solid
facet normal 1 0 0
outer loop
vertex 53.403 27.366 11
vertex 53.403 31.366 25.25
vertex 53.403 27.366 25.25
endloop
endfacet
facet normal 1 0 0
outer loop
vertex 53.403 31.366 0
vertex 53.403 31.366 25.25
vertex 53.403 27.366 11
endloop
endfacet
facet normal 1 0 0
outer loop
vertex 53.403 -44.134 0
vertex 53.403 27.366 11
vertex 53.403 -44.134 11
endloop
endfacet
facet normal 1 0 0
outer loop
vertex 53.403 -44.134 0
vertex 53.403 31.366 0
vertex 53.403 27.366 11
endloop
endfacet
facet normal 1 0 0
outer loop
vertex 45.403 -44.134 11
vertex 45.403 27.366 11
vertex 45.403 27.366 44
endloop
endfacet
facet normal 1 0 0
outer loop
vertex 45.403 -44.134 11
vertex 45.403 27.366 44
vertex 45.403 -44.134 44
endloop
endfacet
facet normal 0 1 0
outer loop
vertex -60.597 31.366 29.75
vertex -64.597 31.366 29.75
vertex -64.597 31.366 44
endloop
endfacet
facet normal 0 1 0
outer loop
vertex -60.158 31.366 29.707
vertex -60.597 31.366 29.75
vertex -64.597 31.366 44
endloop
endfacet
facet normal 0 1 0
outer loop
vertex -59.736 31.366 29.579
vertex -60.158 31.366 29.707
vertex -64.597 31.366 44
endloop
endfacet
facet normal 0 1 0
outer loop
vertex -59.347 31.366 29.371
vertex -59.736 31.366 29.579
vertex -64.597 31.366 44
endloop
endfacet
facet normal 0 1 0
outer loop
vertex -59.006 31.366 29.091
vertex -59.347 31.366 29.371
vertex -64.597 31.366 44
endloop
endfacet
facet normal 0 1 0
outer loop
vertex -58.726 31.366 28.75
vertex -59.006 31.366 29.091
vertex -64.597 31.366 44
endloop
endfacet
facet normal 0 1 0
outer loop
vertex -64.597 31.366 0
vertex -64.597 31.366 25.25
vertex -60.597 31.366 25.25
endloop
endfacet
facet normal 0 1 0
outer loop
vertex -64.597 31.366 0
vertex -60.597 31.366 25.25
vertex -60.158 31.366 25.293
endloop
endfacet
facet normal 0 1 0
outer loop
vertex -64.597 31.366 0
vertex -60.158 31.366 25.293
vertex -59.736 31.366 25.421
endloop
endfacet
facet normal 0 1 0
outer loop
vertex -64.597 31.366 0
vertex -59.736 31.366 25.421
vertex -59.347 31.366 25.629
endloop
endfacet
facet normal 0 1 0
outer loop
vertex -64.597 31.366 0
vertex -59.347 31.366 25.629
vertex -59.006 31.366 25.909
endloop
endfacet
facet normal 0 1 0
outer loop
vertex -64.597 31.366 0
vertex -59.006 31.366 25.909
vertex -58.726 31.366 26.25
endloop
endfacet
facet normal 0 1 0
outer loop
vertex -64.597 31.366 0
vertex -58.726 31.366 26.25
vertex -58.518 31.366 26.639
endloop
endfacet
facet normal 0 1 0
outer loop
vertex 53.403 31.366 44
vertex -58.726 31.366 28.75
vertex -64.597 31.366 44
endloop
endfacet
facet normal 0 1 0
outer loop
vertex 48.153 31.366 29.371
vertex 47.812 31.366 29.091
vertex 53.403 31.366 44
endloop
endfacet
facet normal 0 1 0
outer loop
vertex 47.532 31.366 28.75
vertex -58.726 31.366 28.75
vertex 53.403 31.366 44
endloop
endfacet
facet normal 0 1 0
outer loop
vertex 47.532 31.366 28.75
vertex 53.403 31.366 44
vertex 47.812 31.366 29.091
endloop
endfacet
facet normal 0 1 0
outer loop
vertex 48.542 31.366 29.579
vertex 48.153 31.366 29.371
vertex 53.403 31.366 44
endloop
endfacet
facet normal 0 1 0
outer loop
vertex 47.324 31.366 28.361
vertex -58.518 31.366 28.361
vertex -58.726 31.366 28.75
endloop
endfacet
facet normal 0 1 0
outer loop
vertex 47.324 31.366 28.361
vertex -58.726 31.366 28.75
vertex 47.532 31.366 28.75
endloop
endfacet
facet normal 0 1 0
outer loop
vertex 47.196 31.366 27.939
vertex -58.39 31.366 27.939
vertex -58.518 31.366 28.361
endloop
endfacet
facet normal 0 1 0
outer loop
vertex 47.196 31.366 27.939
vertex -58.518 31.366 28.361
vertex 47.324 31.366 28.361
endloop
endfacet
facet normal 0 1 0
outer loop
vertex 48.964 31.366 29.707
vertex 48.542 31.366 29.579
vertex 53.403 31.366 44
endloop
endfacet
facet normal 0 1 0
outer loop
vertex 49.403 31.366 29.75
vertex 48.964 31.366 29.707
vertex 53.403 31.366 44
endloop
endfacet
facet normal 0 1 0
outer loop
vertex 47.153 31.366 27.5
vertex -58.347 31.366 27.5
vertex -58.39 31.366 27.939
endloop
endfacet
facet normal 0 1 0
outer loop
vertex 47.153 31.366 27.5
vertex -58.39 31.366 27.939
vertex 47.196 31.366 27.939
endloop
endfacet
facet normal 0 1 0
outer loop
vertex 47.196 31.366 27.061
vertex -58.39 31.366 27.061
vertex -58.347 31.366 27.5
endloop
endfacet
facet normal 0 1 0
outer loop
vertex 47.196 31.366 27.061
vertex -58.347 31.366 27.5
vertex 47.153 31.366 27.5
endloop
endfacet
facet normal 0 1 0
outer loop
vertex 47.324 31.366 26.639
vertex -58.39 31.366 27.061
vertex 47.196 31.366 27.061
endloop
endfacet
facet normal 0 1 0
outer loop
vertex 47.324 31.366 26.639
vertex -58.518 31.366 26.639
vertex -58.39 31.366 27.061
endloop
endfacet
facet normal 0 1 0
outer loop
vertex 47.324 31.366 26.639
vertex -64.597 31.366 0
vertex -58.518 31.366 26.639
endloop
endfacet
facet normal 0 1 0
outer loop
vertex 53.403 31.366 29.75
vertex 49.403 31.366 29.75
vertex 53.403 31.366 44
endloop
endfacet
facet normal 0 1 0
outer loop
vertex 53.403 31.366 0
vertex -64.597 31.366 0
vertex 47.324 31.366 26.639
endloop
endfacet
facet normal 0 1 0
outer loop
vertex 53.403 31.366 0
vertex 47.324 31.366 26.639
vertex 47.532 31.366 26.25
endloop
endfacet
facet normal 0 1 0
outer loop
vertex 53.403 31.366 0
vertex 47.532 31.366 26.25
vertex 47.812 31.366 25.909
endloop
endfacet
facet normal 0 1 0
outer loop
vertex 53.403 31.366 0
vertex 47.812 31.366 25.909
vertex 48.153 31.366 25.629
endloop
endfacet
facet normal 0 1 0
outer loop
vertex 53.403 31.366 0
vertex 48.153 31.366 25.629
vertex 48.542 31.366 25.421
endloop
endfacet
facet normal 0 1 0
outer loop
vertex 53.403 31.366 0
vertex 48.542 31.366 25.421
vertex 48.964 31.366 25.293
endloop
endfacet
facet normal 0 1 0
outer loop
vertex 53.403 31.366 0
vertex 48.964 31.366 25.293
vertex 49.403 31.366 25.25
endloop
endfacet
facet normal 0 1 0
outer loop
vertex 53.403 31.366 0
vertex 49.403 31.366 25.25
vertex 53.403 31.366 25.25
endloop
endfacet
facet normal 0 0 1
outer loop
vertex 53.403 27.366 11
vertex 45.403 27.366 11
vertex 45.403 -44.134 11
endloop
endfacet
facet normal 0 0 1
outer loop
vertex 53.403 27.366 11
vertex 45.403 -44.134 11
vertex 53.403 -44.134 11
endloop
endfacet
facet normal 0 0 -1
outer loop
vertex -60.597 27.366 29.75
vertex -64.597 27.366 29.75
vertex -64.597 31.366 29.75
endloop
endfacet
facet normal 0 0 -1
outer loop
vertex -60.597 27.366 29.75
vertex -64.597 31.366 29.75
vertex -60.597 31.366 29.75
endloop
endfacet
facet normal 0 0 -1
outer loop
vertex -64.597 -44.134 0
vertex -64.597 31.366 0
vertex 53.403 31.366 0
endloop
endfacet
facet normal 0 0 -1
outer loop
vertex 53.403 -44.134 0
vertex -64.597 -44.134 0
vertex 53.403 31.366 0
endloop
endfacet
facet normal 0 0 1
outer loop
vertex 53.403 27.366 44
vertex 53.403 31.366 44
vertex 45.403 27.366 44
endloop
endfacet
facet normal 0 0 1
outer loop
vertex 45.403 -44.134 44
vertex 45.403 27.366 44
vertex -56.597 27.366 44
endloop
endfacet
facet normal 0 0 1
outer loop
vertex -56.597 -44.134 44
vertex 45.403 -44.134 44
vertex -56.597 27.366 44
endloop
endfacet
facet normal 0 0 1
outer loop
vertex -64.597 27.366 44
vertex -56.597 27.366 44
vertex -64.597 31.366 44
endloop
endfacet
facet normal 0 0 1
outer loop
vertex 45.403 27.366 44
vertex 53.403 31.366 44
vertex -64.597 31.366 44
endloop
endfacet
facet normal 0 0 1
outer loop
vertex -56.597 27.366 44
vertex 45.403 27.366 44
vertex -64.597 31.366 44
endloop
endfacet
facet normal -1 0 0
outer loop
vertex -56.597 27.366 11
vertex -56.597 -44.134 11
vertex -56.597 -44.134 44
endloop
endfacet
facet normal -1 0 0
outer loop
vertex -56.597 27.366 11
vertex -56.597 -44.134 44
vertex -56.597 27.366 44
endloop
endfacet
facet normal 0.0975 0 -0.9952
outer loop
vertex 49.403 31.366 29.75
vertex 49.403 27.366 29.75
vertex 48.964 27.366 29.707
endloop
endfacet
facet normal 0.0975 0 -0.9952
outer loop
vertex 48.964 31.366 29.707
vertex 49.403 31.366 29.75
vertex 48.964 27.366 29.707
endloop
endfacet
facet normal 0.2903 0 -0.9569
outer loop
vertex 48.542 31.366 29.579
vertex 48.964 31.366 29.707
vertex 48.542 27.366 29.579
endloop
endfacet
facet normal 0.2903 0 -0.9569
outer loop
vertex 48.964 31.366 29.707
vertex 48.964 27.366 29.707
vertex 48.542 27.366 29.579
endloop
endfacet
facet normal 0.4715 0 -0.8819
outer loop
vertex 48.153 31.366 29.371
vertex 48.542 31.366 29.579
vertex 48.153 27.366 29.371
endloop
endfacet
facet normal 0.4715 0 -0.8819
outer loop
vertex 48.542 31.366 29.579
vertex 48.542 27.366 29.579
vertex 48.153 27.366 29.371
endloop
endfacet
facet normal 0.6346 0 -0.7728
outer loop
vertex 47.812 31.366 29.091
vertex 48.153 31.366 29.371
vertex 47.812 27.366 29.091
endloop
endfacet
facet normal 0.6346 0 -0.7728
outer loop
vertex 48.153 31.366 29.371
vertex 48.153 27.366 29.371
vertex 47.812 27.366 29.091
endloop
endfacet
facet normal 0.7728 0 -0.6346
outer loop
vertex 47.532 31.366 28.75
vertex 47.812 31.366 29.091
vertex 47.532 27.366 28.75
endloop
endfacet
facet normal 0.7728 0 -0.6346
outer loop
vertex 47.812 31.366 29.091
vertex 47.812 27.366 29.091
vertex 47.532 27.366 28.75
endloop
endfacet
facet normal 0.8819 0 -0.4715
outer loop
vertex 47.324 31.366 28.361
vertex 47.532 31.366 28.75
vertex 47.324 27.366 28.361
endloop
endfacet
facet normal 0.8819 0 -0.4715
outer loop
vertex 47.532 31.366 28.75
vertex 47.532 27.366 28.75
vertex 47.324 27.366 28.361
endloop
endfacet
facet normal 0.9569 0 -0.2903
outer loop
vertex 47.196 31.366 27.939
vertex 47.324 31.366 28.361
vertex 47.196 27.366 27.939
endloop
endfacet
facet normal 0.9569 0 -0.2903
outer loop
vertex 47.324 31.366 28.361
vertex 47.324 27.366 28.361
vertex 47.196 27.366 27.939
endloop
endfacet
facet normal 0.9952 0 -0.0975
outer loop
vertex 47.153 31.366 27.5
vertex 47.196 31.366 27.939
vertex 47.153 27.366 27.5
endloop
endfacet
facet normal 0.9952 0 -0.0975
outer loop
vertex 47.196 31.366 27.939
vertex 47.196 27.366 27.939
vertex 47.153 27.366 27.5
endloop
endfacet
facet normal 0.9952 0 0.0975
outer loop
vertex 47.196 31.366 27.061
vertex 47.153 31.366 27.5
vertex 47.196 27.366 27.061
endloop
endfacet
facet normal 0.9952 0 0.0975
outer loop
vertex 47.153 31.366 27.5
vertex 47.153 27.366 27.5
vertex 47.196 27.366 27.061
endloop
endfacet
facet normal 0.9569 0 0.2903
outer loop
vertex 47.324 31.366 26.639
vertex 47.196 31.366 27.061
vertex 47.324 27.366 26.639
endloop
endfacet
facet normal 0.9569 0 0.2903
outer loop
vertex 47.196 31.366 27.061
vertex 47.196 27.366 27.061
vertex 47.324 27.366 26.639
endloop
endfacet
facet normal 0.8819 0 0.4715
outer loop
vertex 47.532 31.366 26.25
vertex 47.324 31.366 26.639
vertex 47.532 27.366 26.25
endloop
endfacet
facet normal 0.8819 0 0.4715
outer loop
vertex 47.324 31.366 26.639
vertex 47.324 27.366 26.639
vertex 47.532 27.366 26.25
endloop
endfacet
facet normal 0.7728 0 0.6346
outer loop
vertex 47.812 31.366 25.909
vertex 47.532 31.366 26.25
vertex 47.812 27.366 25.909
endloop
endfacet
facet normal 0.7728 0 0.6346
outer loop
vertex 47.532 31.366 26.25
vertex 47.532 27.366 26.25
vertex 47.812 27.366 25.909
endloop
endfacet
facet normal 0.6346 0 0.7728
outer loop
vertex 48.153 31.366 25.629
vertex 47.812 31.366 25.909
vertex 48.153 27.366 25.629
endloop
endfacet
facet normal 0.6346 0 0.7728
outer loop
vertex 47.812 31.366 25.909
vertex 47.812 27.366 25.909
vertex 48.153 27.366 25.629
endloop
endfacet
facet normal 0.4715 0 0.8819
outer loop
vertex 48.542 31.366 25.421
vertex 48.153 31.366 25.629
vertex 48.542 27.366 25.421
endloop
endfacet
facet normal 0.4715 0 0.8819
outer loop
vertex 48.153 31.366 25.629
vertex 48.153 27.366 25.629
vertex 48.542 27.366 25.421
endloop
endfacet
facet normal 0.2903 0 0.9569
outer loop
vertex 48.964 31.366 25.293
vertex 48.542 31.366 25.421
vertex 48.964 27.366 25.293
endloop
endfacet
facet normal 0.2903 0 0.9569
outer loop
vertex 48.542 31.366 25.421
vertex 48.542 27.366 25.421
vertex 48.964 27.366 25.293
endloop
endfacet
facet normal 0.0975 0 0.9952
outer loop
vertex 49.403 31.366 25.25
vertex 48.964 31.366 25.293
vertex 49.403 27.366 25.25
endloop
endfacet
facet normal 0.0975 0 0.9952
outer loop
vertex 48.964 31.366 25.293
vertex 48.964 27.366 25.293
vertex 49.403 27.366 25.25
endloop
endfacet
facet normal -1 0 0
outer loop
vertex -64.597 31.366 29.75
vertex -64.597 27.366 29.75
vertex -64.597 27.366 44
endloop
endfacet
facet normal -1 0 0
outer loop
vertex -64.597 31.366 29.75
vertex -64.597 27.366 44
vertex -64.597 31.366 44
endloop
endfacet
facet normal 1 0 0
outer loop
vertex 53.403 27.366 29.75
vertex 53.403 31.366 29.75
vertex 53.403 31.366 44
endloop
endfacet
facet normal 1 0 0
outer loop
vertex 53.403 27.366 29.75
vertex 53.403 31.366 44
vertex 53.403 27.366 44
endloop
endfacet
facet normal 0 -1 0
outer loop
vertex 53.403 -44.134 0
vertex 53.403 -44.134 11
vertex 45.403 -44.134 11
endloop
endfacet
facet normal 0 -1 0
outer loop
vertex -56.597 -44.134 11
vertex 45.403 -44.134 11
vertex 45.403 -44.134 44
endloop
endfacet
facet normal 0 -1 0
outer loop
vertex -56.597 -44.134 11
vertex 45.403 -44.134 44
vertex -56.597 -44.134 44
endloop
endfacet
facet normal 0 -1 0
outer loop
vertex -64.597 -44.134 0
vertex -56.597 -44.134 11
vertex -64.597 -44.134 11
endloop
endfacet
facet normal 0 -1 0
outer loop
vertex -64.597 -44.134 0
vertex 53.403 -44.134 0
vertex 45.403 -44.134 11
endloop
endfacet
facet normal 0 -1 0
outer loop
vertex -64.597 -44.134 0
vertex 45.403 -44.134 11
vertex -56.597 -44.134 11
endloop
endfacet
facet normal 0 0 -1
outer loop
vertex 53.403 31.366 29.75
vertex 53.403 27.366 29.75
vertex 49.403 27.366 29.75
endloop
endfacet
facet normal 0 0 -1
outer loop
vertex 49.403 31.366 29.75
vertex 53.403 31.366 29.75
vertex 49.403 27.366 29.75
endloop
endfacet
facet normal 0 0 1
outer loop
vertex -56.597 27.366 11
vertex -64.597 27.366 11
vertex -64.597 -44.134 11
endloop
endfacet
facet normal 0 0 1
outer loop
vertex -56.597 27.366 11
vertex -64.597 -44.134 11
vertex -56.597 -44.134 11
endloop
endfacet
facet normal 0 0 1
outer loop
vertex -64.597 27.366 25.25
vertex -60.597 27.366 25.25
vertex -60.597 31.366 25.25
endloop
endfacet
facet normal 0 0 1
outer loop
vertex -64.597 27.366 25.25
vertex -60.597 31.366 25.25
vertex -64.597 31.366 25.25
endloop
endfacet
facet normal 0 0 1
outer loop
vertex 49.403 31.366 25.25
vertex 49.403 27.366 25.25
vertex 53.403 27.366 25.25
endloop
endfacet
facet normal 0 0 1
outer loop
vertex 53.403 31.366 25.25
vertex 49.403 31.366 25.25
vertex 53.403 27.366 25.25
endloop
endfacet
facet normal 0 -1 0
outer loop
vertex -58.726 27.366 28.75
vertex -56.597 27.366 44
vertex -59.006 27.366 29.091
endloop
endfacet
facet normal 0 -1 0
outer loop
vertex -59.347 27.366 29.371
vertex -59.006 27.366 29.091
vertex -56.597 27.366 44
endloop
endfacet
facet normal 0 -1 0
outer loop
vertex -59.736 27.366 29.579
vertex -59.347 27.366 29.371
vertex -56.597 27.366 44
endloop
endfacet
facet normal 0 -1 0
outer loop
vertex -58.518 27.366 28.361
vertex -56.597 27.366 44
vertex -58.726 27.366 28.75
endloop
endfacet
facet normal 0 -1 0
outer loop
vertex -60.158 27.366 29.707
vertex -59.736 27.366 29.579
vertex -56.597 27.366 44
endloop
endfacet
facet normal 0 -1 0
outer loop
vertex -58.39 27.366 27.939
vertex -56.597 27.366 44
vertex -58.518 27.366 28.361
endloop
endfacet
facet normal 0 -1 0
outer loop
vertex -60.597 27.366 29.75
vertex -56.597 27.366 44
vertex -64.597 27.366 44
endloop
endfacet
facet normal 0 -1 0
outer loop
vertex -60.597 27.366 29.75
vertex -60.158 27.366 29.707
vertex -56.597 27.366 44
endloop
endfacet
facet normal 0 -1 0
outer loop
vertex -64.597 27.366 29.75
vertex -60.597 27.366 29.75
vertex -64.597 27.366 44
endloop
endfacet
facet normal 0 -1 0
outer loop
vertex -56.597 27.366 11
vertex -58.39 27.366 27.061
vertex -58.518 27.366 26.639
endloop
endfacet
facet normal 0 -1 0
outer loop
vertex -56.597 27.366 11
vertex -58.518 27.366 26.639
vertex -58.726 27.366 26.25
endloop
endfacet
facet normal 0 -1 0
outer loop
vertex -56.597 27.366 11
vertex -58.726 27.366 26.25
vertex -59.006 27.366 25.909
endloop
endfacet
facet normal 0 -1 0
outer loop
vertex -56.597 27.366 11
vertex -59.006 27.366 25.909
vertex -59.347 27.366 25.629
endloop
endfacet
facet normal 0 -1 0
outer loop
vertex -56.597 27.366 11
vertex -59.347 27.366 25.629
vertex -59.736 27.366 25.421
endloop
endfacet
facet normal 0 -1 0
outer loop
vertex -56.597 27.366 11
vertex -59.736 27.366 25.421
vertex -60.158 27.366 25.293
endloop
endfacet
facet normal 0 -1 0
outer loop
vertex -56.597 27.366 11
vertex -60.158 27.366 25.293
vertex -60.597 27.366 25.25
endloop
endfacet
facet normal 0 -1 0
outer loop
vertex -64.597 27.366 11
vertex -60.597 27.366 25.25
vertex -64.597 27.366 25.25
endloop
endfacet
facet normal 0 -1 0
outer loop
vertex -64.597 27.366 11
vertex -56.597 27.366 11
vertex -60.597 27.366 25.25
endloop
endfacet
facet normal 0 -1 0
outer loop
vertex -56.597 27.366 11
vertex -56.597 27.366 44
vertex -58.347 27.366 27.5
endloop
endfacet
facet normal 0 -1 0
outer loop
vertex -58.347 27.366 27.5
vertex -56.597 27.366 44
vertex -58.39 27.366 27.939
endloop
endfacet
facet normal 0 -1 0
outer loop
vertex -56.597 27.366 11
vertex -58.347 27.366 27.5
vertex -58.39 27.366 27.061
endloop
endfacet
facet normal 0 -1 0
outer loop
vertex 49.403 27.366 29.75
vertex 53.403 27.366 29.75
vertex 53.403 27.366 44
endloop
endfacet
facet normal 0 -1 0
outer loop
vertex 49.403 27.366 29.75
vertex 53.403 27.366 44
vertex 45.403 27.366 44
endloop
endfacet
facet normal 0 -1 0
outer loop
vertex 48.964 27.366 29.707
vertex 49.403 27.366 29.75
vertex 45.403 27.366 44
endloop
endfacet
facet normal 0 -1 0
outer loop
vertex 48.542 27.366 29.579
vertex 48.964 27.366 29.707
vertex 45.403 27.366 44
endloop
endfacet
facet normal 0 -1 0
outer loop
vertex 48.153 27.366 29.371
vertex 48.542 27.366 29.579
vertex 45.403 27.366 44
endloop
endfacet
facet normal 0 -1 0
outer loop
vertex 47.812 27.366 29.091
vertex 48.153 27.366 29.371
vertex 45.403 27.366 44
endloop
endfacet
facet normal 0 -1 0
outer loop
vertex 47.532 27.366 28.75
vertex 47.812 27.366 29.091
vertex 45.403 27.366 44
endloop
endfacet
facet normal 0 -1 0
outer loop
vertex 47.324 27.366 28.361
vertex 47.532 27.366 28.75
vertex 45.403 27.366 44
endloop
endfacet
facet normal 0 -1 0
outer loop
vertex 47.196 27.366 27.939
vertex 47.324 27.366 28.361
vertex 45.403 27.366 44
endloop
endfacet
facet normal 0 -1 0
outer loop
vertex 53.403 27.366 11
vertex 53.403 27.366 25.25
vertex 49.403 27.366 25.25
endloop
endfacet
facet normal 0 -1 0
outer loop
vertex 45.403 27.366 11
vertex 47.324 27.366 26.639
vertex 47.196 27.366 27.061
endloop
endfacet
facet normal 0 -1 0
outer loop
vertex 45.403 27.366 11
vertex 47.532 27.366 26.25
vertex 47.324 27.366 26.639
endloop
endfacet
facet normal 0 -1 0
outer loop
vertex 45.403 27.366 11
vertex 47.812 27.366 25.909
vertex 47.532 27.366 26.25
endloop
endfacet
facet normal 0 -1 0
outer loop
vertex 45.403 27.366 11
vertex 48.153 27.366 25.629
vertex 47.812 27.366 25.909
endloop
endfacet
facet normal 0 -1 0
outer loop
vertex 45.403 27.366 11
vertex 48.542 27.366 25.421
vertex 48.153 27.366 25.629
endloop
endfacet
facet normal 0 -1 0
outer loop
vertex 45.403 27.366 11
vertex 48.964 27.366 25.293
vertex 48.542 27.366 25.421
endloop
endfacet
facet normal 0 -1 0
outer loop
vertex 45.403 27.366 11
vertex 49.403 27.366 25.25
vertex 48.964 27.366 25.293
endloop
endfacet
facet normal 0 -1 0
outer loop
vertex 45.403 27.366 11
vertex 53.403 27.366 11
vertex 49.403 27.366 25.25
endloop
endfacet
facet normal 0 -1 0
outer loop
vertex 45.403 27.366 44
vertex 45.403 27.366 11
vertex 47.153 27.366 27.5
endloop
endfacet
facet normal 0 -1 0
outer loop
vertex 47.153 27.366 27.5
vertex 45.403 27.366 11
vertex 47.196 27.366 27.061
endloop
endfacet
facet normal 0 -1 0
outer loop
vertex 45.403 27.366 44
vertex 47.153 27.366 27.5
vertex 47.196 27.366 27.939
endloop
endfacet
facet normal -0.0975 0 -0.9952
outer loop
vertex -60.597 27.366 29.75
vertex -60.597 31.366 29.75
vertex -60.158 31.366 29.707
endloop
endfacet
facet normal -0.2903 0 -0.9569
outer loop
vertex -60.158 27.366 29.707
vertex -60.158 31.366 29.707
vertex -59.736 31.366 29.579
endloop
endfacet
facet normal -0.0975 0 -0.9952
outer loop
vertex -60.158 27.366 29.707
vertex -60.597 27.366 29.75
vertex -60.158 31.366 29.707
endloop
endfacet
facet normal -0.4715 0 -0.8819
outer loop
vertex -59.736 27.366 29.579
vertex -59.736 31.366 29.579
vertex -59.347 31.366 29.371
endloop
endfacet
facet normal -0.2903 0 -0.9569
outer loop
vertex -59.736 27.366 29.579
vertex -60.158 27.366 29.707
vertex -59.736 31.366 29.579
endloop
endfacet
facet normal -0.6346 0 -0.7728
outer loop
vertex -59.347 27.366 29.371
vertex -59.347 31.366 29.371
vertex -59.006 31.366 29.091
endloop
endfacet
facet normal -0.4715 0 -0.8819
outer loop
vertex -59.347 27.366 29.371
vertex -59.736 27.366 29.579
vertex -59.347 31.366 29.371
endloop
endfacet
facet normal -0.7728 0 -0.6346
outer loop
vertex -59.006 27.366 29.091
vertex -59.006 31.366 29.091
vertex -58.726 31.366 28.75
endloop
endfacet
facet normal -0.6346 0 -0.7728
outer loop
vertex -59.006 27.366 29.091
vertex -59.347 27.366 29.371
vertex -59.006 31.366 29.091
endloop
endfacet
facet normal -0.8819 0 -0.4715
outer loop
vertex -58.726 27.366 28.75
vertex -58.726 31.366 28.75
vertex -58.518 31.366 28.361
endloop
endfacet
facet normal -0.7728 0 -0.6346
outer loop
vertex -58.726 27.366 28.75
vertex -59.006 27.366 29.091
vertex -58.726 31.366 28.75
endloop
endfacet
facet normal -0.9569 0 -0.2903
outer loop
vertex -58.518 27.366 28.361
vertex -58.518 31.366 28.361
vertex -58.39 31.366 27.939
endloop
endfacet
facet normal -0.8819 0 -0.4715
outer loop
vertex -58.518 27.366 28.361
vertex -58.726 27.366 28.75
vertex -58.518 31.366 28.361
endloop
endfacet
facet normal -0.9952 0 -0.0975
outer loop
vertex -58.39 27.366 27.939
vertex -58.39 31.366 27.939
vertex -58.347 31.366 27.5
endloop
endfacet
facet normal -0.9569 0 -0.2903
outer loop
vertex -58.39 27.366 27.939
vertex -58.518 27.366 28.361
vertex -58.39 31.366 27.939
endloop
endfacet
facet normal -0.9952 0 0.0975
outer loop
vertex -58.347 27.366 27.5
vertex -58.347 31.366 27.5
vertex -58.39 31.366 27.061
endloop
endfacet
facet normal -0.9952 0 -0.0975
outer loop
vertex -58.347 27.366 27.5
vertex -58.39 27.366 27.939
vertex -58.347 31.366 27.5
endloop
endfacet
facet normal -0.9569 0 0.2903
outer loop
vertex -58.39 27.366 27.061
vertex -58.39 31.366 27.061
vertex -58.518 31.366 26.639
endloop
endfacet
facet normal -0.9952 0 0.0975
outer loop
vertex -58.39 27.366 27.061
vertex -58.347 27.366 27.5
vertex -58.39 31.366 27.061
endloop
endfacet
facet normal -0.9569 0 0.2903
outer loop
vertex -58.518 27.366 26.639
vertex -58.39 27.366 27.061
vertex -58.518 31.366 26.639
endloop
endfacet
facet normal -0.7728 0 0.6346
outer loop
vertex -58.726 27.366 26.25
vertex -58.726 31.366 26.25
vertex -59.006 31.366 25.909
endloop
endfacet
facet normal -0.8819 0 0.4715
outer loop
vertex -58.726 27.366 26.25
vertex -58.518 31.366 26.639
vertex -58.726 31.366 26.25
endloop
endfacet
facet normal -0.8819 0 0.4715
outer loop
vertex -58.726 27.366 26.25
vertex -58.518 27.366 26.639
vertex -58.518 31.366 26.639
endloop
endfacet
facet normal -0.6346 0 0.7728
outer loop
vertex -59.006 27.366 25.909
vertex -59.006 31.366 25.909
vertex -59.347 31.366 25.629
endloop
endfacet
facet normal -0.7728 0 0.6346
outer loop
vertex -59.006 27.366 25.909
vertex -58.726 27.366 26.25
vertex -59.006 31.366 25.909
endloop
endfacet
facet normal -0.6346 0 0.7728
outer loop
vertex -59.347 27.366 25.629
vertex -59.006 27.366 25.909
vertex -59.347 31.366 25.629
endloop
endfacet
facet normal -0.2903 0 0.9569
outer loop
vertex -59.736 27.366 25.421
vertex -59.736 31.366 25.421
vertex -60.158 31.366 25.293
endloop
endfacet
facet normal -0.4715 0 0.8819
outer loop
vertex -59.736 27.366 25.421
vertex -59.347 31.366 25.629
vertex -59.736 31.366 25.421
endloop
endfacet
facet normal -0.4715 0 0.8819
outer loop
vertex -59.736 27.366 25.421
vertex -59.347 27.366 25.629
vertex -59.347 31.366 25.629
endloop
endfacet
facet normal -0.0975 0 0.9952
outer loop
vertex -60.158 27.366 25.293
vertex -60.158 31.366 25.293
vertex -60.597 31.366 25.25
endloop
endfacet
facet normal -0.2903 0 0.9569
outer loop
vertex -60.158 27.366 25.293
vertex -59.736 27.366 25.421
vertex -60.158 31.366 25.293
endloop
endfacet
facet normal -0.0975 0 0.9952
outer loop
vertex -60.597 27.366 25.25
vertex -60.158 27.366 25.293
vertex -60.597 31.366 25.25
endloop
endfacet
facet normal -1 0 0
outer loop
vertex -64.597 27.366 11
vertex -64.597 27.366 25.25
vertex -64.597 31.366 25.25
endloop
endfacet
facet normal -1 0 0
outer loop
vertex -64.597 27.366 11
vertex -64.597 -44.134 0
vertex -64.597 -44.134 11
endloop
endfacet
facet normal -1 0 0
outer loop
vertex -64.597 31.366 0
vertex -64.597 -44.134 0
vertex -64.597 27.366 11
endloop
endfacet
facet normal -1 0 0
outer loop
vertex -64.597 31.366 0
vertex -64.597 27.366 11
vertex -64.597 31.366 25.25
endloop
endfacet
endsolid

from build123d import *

# Parameters (mm, degrees)
ESQUISSE1_W             = 118
ESQUISSE1_H             = 75.5
BOSS_EXTRU_1_DEPTH      = 11
BOSS_EXTRU_2_DEPTH      = 33
ENL_V_MAT_EXTRU_1_REACH = 107.929


with BuildPart() as part:
    # Esquisse1 → Boss.-Extru.1 (new body)
    with BuildSketch(Plane.XY):
        with Locations((-5.596837945, -6.384387352)):
            Rectangle(ESQUISSE1_W, ESQUISSE1_H)
    extrude(amount=BOSS_EXTRU_1_DEPTH)

    # Esquisse2 → Boss.-Extru.2 (add)
    with BuildSketch(Plane.XY.offset(11)):
        Polygon((-64.596837945, 31.365612648), (53.403162055, 31.365612648), (53.403162055, 27.365612648), (45.403162055, 27.365612648), (45.403162055, -44.134387352), (-56.596837945, -44.134387352), (-56.596837945, 27.365612648), (-64.596837945, 27.365612648), align=None)
    extrude(amount=BOSS_EXTRU_2_DEPTH)

    # Esquisse3 → Enlèv. mat.-Extru.1 (cut, up to next)
    with BuildSketch(Plane.XZ.offset(-27.365612648), mode=Mode.PRIVATE) as enl_v_mat_extru_1_sk1:
        with BuildLine():
            Line((-64.596837945, 29.75), (-60.596837945, 29.75))
            ThreePointArc((-60.596837945, 29.75), (-58.346837945, 27.5), (-60.596837945, 25.25))
            Line((-60.596837945, 25.25), (-64.596837945, 25.25))
            Line((-64.596837945, 25.25), (-64.596837945, 29.75))
        make_face()
    enl_v_mat_extru_1_tool1 = extrude(enl_v_mat_extru_1_sk1.sketch, amount=-ENL_V_MAT_EXTRU_1_REACH, mode=Mode.PRIVATE) & part.part
    # Esquisse3 → Enlèv. mat.-Extru.1 (cut, up to next)
    with BuildSketch(Plane.XZ.offset(-27.365612648), mode=Mode.PRIVATE) as enl_v_mat_extru_1_sk2:
        with BuildLine():
            Line((53.403162055, 29.75), (49.403162055, 29.75))
            ThreePointArc((49.403162055, 29.75), (47.153162055, 27.5), (49.403162055, 25.25))
            Line((49.403162055, 25.25), (53.403162055, 25.25))
            Line((53.403162055, 25.25), (53.403162055, 29.75))
        make_face()
    enl_v_mat_extru_1_tool2 = extrude(enl_v_mat_extru_1_sk2.sketch, amount=-ENL_V_MAT_EXTRU_1_REACH, mode=Mode.PRIVATE) & part.part
    add(enl_v_mat_extru_1_tool1.solids().sort_by_distance((-61.6914, 27.365613, 27.5))[0], mode=Mode.SUBTRACT)
    add(enl_v_mat_extru_1_tool2.solids().sort_by_distance((50.497724, 27.365613, 27.5))[0], mode=Mode.SUBTRACT)


solid = part.part
